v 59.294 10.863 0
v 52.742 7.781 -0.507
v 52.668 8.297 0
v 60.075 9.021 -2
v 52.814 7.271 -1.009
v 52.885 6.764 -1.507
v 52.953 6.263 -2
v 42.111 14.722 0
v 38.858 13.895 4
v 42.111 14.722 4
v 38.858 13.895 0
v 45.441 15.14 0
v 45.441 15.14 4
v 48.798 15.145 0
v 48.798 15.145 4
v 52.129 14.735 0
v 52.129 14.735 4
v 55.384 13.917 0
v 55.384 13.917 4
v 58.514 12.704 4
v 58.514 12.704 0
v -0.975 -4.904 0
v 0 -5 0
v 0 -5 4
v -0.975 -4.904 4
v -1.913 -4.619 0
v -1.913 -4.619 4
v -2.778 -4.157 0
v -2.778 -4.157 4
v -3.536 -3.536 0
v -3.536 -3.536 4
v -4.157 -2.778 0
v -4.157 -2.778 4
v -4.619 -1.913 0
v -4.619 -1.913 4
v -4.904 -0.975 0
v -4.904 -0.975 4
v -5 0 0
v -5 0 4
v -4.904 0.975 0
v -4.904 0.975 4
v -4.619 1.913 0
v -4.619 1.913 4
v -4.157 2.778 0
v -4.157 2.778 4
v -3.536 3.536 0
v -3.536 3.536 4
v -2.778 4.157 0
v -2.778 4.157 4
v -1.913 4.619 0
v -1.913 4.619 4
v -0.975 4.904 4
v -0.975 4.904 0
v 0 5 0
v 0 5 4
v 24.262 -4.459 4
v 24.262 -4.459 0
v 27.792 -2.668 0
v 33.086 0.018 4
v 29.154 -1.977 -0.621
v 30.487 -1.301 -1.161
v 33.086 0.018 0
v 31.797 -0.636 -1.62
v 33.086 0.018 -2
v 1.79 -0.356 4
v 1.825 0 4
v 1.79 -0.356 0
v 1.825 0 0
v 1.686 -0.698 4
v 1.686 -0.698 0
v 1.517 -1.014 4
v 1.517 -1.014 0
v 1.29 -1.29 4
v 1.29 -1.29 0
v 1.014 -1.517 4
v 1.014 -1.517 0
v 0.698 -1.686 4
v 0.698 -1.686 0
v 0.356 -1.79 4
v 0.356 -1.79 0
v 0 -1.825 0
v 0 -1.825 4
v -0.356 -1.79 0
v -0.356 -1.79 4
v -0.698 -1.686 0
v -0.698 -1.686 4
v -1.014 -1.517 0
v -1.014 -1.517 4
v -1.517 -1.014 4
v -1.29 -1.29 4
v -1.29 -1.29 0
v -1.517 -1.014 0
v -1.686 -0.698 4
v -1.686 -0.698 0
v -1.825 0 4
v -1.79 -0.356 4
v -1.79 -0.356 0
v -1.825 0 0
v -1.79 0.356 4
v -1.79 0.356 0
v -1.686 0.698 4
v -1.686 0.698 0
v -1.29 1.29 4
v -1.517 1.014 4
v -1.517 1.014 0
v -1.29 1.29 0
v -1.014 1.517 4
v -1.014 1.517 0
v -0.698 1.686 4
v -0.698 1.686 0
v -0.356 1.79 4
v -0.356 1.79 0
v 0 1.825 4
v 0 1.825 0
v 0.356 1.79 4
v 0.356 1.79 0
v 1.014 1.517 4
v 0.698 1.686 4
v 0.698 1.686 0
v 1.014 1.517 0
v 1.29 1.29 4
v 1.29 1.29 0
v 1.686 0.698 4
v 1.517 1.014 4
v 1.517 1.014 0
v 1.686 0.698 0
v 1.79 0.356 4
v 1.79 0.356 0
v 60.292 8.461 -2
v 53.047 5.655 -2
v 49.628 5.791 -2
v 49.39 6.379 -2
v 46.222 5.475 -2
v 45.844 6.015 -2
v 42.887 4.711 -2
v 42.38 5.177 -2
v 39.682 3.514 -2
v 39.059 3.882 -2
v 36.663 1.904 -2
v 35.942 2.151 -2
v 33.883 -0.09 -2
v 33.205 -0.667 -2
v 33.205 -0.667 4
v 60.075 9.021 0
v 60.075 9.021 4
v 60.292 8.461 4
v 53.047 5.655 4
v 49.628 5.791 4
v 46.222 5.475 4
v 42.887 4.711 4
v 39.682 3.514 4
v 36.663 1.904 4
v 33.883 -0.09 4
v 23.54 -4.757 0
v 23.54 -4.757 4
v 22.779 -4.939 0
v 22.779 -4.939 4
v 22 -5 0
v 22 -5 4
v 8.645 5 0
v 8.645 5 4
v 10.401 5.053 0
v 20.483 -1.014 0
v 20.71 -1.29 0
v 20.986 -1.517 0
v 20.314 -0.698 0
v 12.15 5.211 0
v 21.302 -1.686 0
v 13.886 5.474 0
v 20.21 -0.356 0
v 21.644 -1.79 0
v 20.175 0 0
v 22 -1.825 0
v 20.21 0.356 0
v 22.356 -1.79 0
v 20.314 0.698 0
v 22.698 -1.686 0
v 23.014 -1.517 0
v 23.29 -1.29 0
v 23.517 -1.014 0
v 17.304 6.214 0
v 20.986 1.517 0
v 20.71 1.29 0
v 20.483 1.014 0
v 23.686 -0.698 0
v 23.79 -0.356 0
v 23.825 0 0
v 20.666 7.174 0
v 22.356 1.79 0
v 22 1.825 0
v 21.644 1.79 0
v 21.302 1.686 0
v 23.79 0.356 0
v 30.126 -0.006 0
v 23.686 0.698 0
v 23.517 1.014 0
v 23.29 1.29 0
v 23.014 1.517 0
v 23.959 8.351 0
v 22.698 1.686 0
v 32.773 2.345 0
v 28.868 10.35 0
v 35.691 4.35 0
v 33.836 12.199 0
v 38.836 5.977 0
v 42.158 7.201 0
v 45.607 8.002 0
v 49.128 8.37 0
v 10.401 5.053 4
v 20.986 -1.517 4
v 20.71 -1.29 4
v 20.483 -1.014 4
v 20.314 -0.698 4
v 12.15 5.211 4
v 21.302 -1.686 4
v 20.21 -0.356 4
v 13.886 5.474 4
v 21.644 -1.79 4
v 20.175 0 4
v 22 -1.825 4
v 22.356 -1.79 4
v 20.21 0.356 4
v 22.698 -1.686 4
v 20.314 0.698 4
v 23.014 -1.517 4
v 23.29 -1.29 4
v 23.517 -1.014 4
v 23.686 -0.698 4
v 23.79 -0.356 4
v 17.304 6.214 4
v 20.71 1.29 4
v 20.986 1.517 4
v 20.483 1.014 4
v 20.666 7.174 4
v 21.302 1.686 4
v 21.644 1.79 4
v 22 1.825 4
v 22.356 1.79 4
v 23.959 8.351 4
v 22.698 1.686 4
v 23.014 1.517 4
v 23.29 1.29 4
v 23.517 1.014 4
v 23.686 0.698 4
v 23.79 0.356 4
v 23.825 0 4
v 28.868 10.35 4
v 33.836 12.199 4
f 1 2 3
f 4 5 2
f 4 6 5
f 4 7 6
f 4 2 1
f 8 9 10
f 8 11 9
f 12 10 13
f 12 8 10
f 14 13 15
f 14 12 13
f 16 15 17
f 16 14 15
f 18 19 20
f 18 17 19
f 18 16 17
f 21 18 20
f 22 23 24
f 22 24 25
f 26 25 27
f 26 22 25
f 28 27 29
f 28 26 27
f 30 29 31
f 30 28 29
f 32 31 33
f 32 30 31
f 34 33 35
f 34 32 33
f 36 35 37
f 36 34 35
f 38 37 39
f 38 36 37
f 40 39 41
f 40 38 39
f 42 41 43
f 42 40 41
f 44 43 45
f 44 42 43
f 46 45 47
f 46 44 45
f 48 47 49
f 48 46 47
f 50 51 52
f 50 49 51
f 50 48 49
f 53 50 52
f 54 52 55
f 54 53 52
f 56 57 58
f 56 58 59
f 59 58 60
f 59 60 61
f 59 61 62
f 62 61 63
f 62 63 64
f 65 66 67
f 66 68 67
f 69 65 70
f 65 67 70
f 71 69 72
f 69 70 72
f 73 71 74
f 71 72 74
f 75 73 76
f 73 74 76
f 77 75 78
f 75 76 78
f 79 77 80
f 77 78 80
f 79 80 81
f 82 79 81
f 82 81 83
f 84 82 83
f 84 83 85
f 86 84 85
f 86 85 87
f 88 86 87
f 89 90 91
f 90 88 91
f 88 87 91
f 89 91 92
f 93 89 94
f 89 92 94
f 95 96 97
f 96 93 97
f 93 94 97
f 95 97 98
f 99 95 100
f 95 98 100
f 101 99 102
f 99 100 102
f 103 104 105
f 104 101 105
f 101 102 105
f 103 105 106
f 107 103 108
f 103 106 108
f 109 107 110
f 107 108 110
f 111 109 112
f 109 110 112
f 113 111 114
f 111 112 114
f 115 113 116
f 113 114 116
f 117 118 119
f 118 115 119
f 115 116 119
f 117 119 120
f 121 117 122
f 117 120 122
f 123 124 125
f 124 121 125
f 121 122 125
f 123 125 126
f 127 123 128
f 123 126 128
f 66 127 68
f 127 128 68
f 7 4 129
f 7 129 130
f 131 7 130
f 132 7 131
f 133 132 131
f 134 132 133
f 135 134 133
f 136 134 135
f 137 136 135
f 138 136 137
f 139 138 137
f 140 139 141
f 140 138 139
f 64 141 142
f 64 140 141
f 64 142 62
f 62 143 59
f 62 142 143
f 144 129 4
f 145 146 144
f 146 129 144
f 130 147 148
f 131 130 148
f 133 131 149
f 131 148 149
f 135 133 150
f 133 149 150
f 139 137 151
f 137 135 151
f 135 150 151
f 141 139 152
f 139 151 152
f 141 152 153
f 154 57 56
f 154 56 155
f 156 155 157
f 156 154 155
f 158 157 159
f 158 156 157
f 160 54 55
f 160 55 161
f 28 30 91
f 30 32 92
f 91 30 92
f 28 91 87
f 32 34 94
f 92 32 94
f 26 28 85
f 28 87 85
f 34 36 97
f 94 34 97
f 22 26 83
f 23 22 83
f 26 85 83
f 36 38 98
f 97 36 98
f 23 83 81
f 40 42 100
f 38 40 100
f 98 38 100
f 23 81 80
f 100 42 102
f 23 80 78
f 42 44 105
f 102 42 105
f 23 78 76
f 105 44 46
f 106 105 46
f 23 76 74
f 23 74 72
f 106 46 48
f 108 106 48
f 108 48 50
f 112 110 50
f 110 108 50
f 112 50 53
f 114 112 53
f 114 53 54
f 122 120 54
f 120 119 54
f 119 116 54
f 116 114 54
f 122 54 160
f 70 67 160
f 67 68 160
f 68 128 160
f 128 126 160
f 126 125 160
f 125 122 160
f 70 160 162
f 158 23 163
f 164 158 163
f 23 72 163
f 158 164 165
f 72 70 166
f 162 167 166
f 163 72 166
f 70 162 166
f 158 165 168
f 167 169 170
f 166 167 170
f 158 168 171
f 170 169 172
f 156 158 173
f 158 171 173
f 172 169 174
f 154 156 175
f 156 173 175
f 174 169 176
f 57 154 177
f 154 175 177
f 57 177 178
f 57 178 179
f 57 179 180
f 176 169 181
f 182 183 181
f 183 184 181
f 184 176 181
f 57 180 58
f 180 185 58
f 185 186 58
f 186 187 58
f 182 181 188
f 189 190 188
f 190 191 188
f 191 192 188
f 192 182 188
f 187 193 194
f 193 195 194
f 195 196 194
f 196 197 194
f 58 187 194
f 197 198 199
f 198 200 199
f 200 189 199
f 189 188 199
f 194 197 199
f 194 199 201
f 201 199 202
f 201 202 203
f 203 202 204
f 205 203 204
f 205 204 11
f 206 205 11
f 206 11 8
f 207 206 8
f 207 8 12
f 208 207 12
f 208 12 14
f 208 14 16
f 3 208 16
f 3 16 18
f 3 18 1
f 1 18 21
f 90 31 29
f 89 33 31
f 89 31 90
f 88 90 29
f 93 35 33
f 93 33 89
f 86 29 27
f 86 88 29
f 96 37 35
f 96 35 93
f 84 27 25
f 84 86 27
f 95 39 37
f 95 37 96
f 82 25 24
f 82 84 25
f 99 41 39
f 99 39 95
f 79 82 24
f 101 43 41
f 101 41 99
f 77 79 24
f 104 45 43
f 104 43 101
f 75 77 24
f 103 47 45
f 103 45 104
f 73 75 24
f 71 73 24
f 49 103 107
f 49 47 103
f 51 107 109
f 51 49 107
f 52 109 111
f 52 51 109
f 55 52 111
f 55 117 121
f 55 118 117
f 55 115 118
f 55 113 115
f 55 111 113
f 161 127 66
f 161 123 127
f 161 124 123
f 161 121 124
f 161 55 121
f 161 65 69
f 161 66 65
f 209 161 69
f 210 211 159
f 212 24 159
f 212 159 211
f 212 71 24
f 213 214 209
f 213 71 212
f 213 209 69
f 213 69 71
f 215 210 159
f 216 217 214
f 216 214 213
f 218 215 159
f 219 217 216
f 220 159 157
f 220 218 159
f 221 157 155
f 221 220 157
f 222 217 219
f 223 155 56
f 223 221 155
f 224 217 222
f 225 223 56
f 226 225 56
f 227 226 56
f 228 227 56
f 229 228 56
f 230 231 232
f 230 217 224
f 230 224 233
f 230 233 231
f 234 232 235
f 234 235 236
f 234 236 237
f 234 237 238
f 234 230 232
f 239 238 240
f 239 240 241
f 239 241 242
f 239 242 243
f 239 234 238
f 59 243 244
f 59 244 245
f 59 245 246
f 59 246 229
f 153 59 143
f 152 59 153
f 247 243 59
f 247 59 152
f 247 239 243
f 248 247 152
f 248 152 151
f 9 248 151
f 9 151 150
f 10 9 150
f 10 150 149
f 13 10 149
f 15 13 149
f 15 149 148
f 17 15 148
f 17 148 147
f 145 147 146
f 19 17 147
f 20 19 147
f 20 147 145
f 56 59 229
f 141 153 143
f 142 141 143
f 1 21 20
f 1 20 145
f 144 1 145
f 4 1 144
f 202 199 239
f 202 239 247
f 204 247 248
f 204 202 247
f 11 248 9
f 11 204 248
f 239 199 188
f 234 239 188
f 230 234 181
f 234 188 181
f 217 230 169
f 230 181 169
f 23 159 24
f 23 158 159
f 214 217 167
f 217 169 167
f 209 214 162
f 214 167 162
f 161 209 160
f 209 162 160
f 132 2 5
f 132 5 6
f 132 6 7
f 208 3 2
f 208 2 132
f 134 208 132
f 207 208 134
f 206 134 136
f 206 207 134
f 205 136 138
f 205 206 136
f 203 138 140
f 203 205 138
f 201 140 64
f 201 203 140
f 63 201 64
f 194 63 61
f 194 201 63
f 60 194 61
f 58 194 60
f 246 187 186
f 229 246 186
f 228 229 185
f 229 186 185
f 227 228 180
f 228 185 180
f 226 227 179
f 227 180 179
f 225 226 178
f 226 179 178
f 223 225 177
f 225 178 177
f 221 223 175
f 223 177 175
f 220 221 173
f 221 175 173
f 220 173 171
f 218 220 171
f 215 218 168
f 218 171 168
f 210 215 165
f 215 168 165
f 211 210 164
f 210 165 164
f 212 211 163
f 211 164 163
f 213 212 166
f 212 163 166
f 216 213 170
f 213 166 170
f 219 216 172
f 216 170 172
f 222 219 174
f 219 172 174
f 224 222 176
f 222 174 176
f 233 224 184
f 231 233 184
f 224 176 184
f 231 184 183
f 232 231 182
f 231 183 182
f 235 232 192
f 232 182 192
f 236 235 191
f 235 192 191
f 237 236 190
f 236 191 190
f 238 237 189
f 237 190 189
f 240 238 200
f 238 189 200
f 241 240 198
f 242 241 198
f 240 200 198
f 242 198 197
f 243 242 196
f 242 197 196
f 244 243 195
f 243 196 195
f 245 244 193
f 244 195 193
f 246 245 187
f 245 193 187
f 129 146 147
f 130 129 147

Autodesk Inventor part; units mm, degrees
ref_plane "YZ Plane" through (0, 0, 0) normal (1, 0, 0) x (0, 1, 0)
ref_plane "XZ Plane" through (0, 0, 0) normal (0, 1, 0) x (-1, 0, 0)
ref_plane "XY Plane" through (0, 0, 0) normal (0, 0, 1) x (1, 0, 0)
sketch "Náčrt1" plane through (0, 0, 0) normal (0, 0, 1) x (1, 0, 0)
  circle A0 centre (0, 0) radius 1.825
  circle A1 centre (22, 0) radius 1.825
  arc A2 (0, 5) -> (0, -5) centre (0, 0) ccw
  line L0 (0, 0) -> (-0.516, 0)
  line L1 (0, 5) -> (8.645, 5)
  arc A3 (8.645, 5) -> (13.8862, 5.4744) centre (8.645, 34.19) ccw
  arc A4 (8.645, 5) -> (8.645, 5) centre (6.8603, 48.5893) ccw
  arc A5 (58.5138, 12.7037) -> (38.8579, 13.8954) centre (47.1549, -11.9507) ccw
  line L2 (22, -5) -> (0, -5)
  line L3 (24.2622, -4.459) -> (33.0865, 0.0179)
  line L4 (22, 0) -> (22, 6.29)
  line L5 (58.5138, 12.7037) -> (60.0748, 9.0208)
  arc A6 (52.9531, 6.2627) -> (33.0865, 0.0179) centre (50.3132, -20.062) ccw
  arc A7 (22, -5) -> (24.2622, -4.459) centre (22, 0) ccw
  line L6 (52.9531, 6.2627) -> (60.0748, 9.0208)
  line L7 (23.9587, 8.3506) -> (22.7174, 7.8453)
  arc A8 (38.8579, 13.8954) -> (23.9587, 8.3506) centre (92.1034, -151.9688) ccw
  arc A9 (13.8862, 5.4744) -> (23.9587, 8.3506) centre (4.237, 58.3407) ccw
  dimension "d0" = 3.65
  dimension "d2" = 3.65
  dimension "d3" = 10
  dimension "d8" = 0.516
  dimension "d17" = 9.895
  dimension "d18" = 63.1
  dimension "d19" = 20.825
  dimension "d21" = 4
extrude "Vysunutí1" add sketch "Náčrt1" along normal blind 4 contours L1 A4 A3 A9 A8 A5 L5 L6 A6 L3 A7 L2 A2 | L1 A4 picked at (7.0586, 4.9892)
sketch "Náčrt7" plane through (0, 0, 0) normal (0, 0, -1) x (-1, 0, 0)
  arc A0 (-33.0865, 0.0179) -> (-52.9531, 6.2627) centre (-50.3132, -20.062) ccw projected
  line L0 (-60.0748, 9.0208) -> (-52.9531, 6.2627) projected
  line L1 (-60.2916, 8.4611) -> (-53.047, 5.6554) projected
  arc A1 (-33.8826, -0.0897) -> (-53.047, 5.6554) centre (-50.3132, -20.062) ccw projected
  line L2 (-33.2047, -0.6673) -> (-33.0865, 0.0179)
  line L3 (-33.8826, -0.0897) -> (-33.2047, -0.6673) projected
  line L4 (-59.2939, 10.8632) -> (-60.0748, 9.0208) projected
  line L5 (-60.2916, 8.4611) -> (-60.0748, 9.0208)
  point P0 (0, 0)
extrude "Vysunutí5" add sketch "Náčrt7" along normal blind 2 and the other way blind 4
chamfer "Zkosení3" distance 2 angle 45 2 edges at (42.3795, 5.1772, 0) (56.514, 7.6418, 0)
properties part number "lapak2" material "ABS Plastic"
